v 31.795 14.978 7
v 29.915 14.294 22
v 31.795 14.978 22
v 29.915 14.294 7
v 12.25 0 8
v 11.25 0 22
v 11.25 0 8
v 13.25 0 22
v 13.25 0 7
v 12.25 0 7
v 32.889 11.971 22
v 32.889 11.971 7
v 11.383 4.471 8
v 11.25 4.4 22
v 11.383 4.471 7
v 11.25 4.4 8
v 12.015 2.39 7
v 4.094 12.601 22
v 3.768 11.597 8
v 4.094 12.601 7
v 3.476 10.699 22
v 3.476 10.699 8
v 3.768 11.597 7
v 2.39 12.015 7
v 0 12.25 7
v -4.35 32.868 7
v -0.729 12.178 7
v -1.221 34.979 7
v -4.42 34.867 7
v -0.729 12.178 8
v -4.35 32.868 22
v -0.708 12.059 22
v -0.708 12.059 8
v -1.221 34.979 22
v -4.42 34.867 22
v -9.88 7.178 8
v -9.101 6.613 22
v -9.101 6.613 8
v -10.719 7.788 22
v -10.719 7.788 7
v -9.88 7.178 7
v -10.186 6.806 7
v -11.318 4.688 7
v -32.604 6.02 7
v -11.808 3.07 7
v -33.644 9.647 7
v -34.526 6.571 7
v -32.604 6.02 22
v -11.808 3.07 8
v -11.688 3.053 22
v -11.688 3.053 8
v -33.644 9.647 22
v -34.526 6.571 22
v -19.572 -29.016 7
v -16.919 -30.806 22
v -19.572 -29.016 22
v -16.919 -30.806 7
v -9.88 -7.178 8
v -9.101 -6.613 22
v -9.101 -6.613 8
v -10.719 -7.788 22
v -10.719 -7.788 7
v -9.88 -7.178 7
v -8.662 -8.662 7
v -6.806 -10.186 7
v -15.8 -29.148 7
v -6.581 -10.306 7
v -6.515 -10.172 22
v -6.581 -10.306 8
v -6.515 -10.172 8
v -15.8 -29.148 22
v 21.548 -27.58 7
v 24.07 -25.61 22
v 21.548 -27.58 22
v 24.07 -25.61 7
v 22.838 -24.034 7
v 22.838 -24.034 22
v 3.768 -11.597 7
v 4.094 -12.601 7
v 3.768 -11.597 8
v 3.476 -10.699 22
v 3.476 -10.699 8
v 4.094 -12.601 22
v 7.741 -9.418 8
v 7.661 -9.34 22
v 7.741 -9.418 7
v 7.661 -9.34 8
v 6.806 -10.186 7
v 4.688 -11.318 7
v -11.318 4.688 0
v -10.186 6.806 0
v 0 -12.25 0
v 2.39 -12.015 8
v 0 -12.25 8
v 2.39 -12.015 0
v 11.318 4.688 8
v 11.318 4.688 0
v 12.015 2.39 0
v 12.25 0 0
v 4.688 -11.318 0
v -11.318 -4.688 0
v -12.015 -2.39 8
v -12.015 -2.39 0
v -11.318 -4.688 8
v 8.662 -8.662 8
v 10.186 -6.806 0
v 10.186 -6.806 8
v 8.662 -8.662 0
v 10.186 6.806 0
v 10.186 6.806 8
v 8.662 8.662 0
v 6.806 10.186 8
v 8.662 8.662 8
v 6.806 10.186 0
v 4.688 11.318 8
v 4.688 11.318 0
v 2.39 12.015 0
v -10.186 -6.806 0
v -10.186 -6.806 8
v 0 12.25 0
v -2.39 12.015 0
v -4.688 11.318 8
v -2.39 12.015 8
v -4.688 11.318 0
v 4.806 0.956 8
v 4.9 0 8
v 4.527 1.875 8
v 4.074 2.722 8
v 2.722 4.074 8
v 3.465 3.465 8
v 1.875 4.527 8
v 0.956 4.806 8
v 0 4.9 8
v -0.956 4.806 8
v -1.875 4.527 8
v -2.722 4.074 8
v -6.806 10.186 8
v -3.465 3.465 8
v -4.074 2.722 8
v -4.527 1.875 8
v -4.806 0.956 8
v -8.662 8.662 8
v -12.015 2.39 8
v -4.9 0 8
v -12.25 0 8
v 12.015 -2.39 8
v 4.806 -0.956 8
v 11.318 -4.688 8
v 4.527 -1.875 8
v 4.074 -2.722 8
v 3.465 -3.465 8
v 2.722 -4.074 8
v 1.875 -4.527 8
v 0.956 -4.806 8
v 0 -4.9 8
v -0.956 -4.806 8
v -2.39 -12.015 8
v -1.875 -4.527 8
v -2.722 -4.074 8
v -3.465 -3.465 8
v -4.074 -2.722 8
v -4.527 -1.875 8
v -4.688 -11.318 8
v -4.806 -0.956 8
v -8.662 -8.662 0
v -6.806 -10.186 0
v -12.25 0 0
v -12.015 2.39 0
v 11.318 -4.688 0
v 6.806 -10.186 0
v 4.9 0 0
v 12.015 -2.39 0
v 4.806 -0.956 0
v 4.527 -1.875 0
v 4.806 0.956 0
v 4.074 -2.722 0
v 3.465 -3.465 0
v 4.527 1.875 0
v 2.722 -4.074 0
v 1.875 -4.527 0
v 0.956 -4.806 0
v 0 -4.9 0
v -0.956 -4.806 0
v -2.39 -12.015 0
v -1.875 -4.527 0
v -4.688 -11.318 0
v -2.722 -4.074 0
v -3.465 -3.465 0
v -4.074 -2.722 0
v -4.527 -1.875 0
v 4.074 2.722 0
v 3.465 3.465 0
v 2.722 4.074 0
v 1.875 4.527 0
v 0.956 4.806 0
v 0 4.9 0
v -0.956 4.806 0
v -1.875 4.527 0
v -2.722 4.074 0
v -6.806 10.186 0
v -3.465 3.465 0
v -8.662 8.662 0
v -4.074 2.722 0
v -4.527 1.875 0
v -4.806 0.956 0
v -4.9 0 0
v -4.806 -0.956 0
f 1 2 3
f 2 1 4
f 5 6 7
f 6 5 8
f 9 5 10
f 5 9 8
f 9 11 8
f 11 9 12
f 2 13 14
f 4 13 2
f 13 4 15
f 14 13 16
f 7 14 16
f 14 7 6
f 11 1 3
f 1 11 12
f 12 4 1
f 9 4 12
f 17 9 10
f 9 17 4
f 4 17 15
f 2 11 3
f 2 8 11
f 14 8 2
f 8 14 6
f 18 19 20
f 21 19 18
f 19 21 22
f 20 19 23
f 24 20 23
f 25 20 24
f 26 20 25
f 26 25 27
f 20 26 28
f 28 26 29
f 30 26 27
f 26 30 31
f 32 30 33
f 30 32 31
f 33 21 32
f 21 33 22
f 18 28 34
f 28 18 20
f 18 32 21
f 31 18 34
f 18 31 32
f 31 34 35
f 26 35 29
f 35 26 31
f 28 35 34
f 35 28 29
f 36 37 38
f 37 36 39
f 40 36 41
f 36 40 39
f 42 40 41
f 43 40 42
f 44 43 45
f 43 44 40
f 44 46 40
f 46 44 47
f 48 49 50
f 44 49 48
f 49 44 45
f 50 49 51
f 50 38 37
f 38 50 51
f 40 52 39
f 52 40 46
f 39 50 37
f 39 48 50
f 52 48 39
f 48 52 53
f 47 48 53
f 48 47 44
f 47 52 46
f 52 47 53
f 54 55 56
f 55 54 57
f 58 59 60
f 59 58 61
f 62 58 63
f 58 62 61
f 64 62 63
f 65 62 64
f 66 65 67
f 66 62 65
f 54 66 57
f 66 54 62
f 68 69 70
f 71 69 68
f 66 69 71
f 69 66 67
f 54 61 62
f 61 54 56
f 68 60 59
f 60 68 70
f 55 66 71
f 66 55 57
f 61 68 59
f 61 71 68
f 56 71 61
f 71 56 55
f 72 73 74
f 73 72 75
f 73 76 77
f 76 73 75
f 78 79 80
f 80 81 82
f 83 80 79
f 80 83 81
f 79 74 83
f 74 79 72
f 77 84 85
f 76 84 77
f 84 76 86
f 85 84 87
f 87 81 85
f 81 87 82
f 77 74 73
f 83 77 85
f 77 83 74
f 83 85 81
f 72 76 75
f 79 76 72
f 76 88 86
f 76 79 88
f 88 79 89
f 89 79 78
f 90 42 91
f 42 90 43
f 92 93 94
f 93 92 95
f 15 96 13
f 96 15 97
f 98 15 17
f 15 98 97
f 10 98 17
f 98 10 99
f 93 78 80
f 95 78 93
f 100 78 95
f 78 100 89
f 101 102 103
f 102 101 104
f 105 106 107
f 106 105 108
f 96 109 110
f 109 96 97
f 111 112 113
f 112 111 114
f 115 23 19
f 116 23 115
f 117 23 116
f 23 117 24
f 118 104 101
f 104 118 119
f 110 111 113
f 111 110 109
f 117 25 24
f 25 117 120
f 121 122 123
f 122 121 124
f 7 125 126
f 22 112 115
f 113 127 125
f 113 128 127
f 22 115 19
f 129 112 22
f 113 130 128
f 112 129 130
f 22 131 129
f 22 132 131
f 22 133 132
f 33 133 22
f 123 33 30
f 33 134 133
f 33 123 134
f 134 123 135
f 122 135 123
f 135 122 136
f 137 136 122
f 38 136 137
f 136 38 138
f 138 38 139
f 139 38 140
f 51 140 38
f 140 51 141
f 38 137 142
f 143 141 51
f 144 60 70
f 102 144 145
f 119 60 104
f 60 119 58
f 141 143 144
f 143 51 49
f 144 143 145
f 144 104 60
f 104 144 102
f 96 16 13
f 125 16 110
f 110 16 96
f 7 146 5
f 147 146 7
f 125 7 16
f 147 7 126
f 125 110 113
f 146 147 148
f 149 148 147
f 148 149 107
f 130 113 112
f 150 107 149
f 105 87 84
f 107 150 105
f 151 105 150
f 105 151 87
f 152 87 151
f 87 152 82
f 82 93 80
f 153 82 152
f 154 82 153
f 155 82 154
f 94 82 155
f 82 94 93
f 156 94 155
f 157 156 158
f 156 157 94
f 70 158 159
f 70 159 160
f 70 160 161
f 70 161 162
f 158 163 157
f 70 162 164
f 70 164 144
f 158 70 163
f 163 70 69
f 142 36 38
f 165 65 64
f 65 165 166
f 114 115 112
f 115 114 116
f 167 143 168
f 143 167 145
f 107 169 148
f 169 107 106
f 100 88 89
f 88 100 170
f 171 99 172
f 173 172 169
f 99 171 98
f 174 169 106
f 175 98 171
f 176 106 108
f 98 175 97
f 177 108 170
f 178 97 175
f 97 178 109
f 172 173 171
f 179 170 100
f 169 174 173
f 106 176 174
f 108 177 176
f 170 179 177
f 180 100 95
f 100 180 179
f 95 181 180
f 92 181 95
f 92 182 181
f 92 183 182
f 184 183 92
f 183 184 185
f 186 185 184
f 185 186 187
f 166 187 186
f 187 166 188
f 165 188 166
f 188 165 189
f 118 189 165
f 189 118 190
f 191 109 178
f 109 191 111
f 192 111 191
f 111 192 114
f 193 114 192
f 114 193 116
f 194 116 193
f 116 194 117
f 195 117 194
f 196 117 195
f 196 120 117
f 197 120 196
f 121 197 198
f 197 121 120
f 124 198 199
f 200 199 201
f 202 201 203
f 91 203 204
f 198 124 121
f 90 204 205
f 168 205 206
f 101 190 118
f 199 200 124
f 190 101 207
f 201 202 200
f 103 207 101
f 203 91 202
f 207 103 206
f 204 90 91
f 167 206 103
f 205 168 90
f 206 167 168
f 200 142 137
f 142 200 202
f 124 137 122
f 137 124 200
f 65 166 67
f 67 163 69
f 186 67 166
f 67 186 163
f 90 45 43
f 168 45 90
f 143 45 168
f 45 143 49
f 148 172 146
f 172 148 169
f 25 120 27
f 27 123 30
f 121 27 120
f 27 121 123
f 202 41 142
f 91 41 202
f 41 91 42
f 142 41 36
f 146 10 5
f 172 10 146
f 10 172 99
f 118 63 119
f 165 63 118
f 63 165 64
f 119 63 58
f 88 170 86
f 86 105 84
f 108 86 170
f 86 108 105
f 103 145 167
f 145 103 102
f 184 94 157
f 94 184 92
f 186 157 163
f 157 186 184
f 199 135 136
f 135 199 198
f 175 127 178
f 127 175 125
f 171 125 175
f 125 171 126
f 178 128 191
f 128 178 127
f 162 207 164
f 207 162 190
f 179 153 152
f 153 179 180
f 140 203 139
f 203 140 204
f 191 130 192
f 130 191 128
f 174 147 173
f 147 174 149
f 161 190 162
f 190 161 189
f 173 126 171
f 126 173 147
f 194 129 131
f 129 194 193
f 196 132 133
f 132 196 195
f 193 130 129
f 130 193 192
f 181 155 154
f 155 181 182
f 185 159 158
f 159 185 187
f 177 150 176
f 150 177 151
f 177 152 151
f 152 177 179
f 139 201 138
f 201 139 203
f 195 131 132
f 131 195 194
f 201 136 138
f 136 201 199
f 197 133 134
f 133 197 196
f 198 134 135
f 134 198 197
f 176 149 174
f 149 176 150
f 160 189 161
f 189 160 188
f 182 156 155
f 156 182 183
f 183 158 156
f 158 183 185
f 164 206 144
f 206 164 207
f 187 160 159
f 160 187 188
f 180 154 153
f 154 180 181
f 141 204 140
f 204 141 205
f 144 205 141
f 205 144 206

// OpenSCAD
$fn = 32;

// ----------------------------------------------------------------------
// Impeller: 70 mm, 5 blades, 22 mm tall
// ----------------------------------------------------------------------

// --- parameters (mm) ---
center_d = 24.5;          // hub diameter
center_h = 8;             // hub height
wheel_d = 70;             // outer diameter over the blades
blade_count = 5;          // number of blades
blade_t = 2;              // blade thickness
blade_h = 14;             // blade height
blade_in_r = 11.25;       // blade root radius
blade_out_r = 33;         // blade tip radius
sweep = 20;               // blade sweep, degrees
bore_d = 9.8;             // shaft bore

module hub() {
  cylinder(h = center_h, d = center_d);
}

module blade() {
  /* blade swept between two boxes: hull of the root and the tip section */
  hull() {
    translate([blade_in_r, 0, center_h - 1])
      cube([blade_t, blade_t * 2.2, blade_h + 1], center = false);
    rotate([0, 0, sweep])
      translate([blade_out_r, 0, center_h - 1])
        cube([blade_t, blade_t * 1.6, blade_h + 1], center = false);
  }
}

module blades() {
  for (i = [0 : blade_count - 1])
    rotate([0, 0, i * 360 / blade_count]) blade();
}

difference() {
  union() {
    hub();
    blades();
  }
  translate([0, 0, -1]) cylinder(h = center_h + blade_h + 0 + 3, d = bore_d);
}
